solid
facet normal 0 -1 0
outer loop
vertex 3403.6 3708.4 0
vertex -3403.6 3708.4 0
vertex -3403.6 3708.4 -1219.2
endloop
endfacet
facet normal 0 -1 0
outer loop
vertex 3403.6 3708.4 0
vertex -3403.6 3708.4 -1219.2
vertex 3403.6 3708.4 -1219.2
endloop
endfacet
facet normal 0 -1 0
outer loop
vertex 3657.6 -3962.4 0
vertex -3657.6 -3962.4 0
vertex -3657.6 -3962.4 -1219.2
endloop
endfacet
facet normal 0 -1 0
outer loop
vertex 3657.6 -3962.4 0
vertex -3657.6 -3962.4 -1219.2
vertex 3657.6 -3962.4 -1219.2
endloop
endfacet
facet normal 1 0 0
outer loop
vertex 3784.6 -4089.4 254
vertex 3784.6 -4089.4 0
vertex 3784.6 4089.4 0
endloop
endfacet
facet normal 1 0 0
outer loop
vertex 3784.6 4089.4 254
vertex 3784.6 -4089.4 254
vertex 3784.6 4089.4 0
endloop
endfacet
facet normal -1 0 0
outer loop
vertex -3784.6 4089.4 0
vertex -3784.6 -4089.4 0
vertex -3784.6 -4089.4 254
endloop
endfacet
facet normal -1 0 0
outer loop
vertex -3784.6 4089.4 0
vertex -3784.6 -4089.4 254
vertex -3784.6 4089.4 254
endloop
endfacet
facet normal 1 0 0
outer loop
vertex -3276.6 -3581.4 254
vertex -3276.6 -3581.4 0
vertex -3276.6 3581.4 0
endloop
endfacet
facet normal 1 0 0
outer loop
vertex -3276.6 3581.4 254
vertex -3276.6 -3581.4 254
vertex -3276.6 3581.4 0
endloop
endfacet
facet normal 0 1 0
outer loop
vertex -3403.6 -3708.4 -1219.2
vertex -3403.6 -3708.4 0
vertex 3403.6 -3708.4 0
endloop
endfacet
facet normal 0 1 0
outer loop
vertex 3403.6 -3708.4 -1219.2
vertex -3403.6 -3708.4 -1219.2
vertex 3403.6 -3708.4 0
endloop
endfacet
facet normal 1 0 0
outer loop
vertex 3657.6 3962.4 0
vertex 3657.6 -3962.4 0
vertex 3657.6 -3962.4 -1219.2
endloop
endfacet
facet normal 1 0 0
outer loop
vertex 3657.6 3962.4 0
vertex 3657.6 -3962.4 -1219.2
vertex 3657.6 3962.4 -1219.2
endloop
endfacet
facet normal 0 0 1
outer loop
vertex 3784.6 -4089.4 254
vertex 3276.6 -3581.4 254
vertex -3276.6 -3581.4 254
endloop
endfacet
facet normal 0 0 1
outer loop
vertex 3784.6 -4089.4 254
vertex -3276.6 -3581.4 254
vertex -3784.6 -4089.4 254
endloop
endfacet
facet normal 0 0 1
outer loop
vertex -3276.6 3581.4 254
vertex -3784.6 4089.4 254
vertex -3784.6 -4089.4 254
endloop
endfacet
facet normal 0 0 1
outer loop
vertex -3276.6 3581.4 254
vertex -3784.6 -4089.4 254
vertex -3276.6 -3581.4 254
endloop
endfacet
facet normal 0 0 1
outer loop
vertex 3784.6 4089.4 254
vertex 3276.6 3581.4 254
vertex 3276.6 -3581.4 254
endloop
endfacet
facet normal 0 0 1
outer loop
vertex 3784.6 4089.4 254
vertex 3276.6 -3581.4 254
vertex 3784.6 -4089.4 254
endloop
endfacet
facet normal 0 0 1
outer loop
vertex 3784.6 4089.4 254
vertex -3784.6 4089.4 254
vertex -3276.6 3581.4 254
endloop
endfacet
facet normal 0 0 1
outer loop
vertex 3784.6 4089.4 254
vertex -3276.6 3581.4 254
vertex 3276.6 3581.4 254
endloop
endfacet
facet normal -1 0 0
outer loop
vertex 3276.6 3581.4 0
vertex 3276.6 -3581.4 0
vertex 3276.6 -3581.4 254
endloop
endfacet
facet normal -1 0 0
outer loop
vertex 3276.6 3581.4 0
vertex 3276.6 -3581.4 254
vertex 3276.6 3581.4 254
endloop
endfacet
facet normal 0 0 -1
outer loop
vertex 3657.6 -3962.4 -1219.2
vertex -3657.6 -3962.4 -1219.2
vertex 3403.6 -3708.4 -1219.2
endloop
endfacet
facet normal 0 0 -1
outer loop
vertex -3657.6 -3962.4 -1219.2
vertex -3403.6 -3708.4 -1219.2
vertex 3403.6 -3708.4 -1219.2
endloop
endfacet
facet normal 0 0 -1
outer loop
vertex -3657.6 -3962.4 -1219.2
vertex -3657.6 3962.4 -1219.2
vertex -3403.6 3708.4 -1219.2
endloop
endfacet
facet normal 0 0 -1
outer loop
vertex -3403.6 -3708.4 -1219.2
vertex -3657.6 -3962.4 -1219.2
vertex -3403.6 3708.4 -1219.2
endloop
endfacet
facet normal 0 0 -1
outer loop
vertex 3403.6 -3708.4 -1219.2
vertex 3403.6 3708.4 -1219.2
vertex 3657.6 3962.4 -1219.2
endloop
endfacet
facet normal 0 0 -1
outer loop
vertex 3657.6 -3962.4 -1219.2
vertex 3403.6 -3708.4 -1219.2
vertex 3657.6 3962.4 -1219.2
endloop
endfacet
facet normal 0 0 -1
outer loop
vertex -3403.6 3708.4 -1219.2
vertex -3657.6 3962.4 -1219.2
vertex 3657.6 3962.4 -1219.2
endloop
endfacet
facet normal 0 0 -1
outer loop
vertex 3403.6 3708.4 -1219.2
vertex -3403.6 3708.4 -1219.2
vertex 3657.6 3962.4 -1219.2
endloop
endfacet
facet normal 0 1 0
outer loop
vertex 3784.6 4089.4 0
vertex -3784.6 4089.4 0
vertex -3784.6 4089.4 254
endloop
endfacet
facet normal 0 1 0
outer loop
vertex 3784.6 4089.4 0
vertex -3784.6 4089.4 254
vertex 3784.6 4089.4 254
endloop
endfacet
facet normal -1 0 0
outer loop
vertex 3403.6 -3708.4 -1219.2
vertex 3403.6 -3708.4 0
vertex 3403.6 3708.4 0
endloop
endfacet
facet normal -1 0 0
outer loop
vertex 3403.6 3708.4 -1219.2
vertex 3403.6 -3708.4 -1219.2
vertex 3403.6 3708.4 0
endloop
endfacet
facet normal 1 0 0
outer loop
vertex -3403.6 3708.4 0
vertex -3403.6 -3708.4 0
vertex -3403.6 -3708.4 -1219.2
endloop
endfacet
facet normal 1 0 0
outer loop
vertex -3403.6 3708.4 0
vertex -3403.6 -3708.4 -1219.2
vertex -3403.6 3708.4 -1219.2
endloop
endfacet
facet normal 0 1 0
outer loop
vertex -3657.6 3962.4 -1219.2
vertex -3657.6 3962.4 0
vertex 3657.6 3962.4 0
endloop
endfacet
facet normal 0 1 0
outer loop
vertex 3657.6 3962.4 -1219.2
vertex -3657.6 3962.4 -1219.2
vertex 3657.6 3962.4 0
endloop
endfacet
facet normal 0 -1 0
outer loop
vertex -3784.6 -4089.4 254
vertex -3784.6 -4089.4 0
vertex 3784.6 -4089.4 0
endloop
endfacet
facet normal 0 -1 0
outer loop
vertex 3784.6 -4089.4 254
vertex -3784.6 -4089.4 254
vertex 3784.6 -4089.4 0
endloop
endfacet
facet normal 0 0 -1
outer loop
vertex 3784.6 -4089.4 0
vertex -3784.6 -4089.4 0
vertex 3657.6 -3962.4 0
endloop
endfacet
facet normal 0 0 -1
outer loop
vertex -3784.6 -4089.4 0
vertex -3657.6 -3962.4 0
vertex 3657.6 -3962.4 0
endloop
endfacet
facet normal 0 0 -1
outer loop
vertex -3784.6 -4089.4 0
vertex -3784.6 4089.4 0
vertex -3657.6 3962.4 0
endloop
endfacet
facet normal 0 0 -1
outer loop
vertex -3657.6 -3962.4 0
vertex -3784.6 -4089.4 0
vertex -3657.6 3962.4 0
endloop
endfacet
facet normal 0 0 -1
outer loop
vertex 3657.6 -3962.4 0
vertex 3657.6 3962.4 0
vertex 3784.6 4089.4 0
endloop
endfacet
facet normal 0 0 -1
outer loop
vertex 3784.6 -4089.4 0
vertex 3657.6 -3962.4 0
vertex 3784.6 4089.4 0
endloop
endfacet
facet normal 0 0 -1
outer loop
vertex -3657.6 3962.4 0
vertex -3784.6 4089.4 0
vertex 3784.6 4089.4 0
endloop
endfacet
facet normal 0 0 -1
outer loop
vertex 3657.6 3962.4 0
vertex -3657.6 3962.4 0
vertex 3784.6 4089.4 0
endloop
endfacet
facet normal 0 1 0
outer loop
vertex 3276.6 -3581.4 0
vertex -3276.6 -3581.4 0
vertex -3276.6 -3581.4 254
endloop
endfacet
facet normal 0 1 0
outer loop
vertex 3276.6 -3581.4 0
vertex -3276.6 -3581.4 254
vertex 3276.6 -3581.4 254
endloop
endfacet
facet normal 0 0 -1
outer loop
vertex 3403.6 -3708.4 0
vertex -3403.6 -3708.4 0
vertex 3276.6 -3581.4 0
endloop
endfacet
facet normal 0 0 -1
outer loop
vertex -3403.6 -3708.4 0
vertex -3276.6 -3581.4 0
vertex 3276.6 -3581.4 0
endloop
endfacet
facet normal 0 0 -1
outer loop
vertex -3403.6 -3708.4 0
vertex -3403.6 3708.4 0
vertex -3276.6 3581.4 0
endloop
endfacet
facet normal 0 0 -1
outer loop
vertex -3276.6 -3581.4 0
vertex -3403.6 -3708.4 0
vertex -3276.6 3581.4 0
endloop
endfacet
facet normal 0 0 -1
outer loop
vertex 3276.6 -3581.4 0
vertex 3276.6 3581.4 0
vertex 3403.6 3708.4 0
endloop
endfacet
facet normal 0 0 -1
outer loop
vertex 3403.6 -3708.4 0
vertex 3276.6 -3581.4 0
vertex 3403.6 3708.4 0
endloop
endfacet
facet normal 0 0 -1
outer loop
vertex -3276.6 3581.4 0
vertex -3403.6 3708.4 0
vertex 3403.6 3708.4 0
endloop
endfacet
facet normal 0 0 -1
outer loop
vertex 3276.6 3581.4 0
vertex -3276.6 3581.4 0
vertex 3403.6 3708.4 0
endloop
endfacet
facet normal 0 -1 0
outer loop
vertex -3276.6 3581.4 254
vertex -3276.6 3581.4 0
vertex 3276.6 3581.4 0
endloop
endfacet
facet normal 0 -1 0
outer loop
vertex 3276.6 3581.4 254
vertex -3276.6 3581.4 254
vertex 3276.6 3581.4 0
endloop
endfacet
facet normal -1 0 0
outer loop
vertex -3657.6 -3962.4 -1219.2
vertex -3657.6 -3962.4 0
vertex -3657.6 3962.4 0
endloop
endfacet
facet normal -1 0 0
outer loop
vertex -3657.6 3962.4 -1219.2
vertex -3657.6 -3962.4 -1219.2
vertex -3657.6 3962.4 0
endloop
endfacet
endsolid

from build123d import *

# Parameters (mm, degrees)
F1_W     = 7315.2
F1_H     = 7924.8
F1_W_2   = 6807.2
F1_H_2   = 7416.8
F2_DEPTH = 1219.2
F3_W     = 7569.2
F3_H     = 8178.8
F3_W_2   = 6553.2
F3_H_2   = 7162.8
F4_DEPTH = 254


with BuildPart() as f2:
    # F1 (on face) → F2 (new body)
    with BuildSketch(Plane.XY):
        Rectangle(F1_W, F1_H)
        Rectangle(F1_W_2, F1_H_2, mode=Mode.SUBTRACT)
    extrude(amount=-F2_DEPTH)

    # F3 (on Top) → F4 (join)
    with BuildSketch(Plane.XY):
        Rectangle(F3_W, F3_H)
        Rectangle(F3_W_2, F3_H_2, mode=Mode.SUBTRACT)
    extrude(amount=F4_DEPTH)


solid = f2.part
